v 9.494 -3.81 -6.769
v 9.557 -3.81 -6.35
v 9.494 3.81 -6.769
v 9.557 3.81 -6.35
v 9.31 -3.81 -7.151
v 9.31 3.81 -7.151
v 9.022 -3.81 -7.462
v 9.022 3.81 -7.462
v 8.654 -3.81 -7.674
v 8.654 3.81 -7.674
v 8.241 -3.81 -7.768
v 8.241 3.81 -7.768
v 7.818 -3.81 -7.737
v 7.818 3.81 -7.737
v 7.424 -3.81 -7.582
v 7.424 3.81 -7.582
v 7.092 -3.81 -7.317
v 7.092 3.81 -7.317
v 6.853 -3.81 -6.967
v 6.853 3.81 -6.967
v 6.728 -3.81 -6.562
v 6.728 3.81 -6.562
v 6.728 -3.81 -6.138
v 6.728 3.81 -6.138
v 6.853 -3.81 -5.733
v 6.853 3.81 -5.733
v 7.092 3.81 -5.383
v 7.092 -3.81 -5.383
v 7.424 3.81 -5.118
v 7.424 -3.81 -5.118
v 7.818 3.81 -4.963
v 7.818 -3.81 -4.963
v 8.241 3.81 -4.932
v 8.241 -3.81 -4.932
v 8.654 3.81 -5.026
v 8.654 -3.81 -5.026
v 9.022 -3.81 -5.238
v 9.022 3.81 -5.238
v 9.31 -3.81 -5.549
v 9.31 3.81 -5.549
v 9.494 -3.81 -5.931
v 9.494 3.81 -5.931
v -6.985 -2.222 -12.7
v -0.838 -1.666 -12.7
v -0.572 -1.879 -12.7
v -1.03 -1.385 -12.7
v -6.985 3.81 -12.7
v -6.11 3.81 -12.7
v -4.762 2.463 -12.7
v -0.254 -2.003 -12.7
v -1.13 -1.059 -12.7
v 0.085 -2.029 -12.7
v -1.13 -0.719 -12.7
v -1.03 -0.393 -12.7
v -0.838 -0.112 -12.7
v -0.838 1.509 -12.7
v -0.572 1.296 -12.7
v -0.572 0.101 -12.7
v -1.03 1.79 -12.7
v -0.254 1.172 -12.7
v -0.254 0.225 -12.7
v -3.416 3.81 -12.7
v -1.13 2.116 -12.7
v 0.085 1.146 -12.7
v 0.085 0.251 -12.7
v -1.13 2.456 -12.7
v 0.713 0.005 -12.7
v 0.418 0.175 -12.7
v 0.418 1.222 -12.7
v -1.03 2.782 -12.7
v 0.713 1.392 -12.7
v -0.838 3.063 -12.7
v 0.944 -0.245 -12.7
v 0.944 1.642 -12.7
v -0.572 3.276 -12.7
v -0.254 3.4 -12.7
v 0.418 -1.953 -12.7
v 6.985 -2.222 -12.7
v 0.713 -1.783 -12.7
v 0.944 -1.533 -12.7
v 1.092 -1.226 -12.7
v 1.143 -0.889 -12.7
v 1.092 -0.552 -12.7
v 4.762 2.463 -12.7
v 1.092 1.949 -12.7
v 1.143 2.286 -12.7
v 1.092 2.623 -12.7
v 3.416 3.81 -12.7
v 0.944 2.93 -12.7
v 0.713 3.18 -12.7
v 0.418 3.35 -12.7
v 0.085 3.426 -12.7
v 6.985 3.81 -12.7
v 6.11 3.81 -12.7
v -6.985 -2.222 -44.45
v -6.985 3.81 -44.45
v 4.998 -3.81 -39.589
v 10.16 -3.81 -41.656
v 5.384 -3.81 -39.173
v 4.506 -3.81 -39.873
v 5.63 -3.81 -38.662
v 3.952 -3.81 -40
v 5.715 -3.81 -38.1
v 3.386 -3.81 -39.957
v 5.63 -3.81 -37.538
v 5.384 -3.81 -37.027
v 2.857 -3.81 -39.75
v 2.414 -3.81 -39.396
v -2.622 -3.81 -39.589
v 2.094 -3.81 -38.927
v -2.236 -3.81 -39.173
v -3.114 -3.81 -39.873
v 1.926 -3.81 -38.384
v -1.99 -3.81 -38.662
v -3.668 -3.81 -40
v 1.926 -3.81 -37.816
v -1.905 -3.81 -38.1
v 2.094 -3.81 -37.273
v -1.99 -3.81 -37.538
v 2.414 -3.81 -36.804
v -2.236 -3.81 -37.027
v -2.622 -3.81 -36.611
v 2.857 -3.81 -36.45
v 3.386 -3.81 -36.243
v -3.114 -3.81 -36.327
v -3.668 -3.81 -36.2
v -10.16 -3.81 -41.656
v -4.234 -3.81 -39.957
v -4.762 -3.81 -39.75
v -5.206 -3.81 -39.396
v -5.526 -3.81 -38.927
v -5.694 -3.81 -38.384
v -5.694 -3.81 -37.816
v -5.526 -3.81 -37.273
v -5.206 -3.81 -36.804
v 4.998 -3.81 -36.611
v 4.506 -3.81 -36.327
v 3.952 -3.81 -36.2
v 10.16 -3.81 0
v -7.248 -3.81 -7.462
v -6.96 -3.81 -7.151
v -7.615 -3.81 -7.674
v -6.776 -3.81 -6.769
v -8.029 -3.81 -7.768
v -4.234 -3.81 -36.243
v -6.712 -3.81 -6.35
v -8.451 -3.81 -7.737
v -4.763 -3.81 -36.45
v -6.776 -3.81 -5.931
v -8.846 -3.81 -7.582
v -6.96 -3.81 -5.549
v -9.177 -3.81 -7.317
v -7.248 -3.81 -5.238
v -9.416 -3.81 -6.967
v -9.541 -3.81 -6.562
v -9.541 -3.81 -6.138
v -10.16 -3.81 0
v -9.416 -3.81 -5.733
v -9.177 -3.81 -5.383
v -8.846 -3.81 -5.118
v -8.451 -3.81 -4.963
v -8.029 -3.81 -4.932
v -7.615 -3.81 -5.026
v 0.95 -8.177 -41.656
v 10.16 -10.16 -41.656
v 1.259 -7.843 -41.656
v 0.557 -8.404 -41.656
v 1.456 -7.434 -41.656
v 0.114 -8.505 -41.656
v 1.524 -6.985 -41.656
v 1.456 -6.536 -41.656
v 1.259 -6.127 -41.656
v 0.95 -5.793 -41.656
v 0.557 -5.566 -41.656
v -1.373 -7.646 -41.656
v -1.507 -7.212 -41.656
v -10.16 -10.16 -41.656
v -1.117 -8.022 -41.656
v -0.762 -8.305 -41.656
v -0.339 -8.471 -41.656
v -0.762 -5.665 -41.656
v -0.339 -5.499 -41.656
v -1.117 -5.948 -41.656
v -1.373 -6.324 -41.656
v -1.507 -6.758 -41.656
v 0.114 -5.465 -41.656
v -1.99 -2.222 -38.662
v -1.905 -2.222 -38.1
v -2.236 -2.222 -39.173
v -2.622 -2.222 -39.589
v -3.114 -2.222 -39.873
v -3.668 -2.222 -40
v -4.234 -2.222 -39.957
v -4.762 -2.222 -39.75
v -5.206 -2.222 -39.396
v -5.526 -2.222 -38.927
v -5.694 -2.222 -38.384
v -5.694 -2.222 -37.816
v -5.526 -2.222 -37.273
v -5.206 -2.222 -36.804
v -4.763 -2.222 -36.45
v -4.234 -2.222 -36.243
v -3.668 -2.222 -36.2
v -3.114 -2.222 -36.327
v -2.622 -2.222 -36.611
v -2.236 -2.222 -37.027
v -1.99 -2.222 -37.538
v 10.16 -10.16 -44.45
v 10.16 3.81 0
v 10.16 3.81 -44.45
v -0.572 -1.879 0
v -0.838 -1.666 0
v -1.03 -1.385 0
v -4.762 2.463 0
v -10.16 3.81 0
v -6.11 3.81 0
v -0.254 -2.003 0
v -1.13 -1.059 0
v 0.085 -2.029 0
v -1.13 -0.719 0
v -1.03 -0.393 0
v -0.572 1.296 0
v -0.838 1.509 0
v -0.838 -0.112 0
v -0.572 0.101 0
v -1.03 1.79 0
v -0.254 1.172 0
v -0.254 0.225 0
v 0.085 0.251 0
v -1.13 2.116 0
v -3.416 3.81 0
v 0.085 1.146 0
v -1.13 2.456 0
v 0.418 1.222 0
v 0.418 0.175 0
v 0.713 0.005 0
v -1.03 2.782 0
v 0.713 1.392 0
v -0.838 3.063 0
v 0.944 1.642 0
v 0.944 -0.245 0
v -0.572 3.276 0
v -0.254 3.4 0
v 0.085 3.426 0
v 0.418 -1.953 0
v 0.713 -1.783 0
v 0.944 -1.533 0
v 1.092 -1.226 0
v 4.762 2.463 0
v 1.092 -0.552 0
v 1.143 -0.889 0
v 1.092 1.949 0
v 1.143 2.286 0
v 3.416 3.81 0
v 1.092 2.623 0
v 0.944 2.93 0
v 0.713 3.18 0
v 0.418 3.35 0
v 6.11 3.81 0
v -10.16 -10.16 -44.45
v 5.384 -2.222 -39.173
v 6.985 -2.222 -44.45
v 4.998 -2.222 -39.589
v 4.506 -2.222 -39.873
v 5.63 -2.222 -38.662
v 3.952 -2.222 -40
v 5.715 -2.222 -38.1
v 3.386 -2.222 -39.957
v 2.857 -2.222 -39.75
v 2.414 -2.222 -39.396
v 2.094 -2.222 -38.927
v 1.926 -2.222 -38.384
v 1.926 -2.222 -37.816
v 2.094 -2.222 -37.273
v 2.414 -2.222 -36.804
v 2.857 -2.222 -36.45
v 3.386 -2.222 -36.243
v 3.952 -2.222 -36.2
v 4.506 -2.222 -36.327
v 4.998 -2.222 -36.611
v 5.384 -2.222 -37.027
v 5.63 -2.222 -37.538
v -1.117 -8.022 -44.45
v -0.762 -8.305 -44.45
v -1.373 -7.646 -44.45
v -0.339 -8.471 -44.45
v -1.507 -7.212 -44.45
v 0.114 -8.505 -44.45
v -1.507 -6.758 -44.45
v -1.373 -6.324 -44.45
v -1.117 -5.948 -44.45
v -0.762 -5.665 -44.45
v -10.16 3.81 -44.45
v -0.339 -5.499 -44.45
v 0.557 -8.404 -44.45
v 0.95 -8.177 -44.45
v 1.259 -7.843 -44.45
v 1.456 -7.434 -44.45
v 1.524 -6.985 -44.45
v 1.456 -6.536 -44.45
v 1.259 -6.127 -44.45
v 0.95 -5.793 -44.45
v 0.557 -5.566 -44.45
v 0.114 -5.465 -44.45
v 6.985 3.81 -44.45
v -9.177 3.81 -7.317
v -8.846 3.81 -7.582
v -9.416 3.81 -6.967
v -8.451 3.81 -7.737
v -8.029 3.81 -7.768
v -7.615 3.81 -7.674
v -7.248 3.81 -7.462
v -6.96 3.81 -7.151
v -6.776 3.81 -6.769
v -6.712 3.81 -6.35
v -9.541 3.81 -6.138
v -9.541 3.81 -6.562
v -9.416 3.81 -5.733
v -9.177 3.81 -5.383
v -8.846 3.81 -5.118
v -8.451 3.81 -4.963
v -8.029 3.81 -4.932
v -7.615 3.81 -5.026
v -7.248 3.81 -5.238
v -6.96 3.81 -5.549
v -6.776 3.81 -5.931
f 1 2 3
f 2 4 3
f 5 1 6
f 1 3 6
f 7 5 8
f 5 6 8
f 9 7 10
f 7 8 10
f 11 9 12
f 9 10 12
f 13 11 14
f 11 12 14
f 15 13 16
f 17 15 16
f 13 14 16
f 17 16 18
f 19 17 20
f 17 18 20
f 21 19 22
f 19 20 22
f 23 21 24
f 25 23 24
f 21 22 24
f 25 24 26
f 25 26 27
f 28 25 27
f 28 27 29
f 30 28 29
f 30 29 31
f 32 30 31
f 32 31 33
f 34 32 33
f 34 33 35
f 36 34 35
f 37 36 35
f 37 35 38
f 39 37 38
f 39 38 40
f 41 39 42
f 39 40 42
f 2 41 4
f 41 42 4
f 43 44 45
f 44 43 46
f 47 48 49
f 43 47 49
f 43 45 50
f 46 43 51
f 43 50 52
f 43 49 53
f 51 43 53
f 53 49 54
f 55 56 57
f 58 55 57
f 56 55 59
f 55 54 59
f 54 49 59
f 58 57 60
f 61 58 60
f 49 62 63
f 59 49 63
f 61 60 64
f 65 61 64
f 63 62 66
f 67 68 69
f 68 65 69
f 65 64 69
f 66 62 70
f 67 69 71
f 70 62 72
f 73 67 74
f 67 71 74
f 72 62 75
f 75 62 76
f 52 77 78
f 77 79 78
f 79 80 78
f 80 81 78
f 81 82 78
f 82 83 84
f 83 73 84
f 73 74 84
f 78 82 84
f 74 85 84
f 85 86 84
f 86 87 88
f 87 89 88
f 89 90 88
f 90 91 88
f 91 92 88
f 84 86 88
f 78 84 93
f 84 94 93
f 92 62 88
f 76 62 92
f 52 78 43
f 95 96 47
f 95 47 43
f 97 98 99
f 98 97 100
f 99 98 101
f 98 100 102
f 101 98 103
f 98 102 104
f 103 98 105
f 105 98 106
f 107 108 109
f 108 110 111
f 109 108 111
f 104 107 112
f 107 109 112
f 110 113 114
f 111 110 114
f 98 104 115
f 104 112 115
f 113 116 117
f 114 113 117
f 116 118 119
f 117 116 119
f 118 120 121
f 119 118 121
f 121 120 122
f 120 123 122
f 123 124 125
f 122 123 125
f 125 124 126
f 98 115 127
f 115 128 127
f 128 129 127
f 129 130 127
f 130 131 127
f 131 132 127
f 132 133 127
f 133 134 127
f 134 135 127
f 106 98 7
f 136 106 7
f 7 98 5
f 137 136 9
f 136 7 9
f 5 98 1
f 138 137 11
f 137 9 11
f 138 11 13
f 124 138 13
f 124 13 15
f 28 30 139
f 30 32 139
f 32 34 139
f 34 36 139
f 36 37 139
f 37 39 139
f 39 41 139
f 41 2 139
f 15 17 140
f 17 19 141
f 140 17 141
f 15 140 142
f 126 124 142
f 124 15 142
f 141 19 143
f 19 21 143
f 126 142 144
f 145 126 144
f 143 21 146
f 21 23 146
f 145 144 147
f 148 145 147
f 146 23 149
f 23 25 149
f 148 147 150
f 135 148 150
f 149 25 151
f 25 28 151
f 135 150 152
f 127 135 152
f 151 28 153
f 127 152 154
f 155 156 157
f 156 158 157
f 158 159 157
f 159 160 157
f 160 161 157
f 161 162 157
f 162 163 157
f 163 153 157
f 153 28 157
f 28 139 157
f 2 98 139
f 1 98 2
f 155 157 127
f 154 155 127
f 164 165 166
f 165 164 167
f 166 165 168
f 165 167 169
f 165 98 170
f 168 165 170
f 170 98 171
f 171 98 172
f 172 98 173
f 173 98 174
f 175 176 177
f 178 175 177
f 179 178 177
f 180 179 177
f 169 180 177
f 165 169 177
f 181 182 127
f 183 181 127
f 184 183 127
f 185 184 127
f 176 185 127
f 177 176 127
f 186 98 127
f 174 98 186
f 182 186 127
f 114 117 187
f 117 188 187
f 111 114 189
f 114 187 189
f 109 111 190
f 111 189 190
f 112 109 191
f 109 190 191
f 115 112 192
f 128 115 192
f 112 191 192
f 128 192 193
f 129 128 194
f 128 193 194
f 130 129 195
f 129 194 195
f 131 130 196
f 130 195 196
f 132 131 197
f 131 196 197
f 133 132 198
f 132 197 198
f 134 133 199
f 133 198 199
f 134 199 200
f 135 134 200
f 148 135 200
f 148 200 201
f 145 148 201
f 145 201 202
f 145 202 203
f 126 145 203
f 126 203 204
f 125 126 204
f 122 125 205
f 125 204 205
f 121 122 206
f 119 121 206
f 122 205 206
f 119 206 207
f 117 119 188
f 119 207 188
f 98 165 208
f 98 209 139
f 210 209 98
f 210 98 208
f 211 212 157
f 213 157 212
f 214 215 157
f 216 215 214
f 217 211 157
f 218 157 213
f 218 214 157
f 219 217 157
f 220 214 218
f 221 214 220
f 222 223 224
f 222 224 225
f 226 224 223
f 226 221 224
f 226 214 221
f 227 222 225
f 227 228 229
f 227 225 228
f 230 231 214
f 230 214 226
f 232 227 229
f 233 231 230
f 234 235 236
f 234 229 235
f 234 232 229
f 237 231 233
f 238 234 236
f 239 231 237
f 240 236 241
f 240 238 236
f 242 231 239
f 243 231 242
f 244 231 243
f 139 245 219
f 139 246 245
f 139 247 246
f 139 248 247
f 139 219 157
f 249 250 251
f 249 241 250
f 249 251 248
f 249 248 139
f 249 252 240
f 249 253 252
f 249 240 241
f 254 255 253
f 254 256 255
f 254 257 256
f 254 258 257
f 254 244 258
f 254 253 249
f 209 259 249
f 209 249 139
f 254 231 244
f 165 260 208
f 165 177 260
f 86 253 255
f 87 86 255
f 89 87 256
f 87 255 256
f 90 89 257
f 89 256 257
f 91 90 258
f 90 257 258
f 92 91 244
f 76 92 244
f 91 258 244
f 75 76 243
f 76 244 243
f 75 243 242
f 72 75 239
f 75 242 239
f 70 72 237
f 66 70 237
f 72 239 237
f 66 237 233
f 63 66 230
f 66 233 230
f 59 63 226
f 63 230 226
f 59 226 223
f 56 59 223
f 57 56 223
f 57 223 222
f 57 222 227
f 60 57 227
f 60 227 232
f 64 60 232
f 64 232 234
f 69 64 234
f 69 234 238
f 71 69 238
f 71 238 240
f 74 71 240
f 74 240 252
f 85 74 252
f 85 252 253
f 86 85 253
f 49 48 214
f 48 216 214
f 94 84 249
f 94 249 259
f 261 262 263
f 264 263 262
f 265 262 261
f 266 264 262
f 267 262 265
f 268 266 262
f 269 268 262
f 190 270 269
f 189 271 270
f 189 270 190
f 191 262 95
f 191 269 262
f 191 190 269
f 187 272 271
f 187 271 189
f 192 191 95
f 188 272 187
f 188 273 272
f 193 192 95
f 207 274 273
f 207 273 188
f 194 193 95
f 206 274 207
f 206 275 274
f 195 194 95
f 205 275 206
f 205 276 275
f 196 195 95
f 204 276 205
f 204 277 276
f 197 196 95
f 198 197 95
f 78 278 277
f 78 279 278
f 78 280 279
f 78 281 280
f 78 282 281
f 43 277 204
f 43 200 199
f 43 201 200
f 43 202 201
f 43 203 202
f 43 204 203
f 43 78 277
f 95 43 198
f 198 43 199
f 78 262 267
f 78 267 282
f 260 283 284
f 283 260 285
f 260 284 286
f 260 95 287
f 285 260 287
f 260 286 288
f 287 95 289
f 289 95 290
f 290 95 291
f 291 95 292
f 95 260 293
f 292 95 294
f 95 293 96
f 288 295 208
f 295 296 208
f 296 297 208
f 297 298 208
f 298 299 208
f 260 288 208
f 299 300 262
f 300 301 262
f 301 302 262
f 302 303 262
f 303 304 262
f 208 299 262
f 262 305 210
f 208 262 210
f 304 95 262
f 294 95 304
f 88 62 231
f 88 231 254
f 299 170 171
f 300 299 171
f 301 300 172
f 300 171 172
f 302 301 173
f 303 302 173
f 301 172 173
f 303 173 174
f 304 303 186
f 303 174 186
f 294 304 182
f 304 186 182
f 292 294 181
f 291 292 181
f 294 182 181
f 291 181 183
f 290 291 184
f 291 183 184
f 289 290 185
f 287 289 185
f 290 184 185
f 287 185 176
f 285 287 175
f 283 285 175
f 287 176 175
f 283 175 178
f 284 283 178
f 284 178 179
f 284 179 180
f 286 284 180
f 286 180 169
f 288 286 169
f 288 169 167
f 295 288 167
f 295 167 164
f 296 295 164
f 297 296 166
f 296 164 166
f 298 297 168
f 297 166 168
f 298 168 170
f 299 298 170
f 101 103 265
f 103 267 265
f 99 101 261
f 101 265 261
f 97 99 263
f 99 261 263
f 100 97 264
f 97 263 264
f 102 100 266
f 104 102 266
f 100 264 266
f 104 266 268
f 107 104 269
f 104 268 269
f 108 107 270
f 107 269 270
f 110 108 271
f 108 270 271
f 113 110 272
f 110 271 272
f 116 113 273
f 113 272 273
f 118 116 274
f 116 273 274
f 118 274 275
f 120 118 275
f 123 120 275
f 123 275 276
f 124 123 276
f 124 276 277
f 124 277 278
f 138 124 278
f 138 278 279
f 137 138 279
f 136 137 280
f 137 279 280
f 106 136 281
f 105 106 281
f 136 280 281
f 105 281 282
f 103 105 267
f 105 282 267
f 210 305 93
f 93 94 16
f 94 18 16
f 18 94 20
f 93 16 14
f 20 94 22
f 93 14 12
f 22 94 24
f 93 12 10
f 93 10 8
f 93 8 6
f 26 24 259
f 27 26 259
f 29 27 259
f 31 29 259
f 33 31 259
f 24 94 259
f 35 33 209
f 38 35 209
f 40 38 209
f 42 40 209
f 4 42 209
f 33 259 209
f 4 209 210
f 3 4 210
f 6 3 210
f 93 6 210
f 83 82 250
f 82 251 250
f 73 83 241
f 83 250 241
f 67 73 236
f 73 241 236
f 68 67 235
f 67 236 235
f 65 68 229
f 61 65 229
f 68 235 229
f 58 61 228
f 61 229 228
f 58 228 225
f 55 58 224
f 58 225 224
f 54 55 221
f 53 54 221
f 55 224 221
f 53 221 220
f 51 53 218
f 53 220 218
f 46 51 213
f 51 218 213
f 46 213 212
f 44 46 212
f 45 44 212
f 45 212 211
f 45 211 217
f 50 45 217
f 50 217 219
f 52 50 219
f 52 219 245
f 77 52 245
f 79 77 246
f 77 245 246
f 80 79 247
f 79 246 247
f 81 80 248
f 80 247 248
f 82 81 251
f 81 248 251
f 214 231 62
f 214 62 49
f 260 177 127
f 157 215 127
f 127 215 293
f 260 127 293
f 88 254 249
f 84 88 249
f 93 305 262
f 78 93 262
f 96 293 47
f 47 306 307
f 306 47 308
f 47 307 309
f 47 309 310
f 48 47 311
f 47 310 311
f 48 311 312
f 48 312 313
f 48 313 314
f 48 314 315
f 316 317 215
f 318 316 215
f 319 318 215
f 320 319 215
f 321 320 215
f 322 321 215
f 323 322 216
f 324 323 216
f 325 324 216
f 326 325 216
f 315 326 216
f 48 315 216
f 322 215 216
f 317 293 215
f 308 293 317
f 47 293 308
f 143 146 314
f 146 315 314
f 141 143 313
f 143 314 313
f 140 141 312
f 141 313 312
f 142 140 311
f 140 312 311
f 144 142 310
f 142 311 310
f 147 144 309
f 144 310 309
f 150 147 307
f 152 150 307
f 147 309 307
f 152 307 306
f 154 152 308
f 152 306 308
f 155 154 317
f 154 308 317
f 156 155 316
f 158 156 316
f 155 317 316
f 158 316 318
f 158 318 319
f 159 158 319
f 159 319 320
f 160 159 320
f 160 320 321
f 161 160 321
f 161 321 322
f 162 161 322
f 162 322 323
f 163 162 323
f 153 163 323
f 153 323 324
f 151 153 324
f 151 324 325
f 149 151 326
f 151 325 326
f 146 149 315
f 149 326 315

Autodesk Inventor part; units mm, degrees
ref_plane "YZ Plane" through (0, 0, 0) normal (1, 0, 0) x (0, 1, 0)
ref_plane "XZ Plane" through (0, 0, 0) normal (0, 1, 0) x (-1, 0, 0)
ref_plane "XY Plane" through (0, 0, 0) normal (0, 0, 1) x (1, 0, 0)
sketch "Sketch1" plane through (0, 0, 0) normal (0, 0, 1) x (1, 0, 0)
  line L0 (-10.16, 3.81) -> (10.16, 3.81)
  line L1 (10.16, 3.81) -> (10.16, -3.81)
  line L2 (10.16, -3.81) -> (-10.16, -3.81)
  line L3 (-10.16, -3.81) -> (-10.16, 3.81)
  point P0 (0, 0)
  dimension "d0" = 20.32
  dimension "d1" = 7.62
  dimension "d2" = 3.81
  dimension "d3" = 10.16
extrude "Extrusion1" add sketch "Sketch1" against normal blind 12.7
sketch "Sketch2" plane through (0, 0, 0) normal (0, 0, 1) x (1, 0, 0)
  line L0 (-10.16, 3.81) -> (10.16, 3.81) projected
  circle A0 centre (0, 2.286) radius 1.143
  circle A1 centre (0, -0.889) radius 1.143
  circle A2 centre (-4.7625, 3.81) radius 0.9525
  circle A3 centre (4.7625, 3.81) radius 0.9525
  line L1 (-6.1095, 3.81) -> (-3.5541, 1.2546)
  line L2 (-3.4155, 3.81) -> (-5.4913, 1.7342)
  line L3 (3.4155, 3.81) -> (5.9385, 1.2869)
  line L4 (4.5051, 2.2056) -> (6.1095, 3.81)
  point P0 (0, 0)
  point P1 (-4.7625, 2.463)
  point P2 (4.7625, 2.463)
  dimension "d6" = 2.286
  dimension "d7" = 2.286
  dimension "d8" = 1.524
  dimension "d9" = 3.175
  dimension "d10" = 1.905
  dimension "d11" = 1.905
  dimension "d12" = 0
  dimension "d13" = 0
  dimension "d14" = 9.525
  dimension "d15" = 4.7625
  dimension "d16" = 45
  dimension "d17" = 45
  dimension "d18" = 45
  dimension "d19" = 45
extrude "Extrusion3" cut sketch "Sketch2" against normal blind 12.7 contours L0 A3 L3 | A2 L0 | L0 L2 A2 | A2 L1 L0 | L2 L1 A2 | L0 A3 | A3 L4 L3 | L0 L4 A3 | A0 | A1 picked at (-4.7051, 3.27) picked at (4.6576, 3.5103)
sketch "Sketch3" plane through (-10.16, 3.81, 0) normal (0, 1, 0) x (1, 0, 0)
  line L0 (4.0505, 12.7) -> (0, 12.7) projected
  line L1 (0, 0) -> (0, 12.7) projected
  line L2 (0, 0) -> (4.0505, 0) projected
  circle A0 centre (2.0252, 6.35) radius 1.4224
  point P0 (10.16, 0)
  dimension "d24" = 2.8448
  dimension "d25" = 6.35
  dimension "d26" = 12.7
  dimension "d31" = 4.0505
  dimension "d32" = 2.0252
sketch "Sketch4" plane through (10.16, 3.81, 0) normal (0, 1, 0) x (1, 0, 0)
  line L0 (-4.0505, 0) -> (0, 0) projected
  line L1 (0, 0) -> (0, 12.7) projected
  circle A0 centre (-2.0252, 6.35) radius 1.4224
  point P0 (-4.0505, 12.7)
  point P1 (-10.16, 0)
  dimension "d27" = 2.8448
  dimension "d28" = 6.35
  dimension "d29" = 4.0505
  dimension "d30" = 2.0252
extrude "Extrusion4" cut sketch "Sketch3" against normal blind 12.7
extrude "Extrusion5" cut sketch "Sketch4" against normal blind 12.7
sketch "Sketch5" plane through (0, 0, -12.7) normal (0, 0, -1) x (-1, 0, 0)
  line L0 (-10.16, -3.81) -> (-10.16, 3.81) projected
  line L1 (10.16, -3.81) -> (-10.16, -3.81) projected
  line L2 (10.16, 3.81) -> (10.16, -3.81) projected
  line L3 (-10.16, 3.81) -> (-6.985, 3.81)
  line L4 (-6.985, 3.81) -> (-6.985, -3.81)
  line L5 (-6.985, -3.81) -> (-10.16, -3.81)
  line L6 (-10.16, -3.81) -> (-10.16, 3.81)
  line L7 (10.16, 3.81) -> (6.985, 3.81)
  line L8 (6.985, 3.81) -> (6.985, -3.81)
  line L9 (6.985, -3.81) -> (10.16, -3.81)
  line L10 (10.16, -3.81) -> (10.16, 3.81)
  line L11 (-10.16, -2.2225) -> (6.985, -2.2225)
  line L12 (6.985, -2.2225) -> (6.985, -3.81)
  line L13 (6.985, -3.81) -> (-10.16, -3.81)
  line L14 (-10.16, -3.81) -> (-10.16, -2.2225)
  point P0 (0, 0)
  dimension "d37" = 3.175
  dimension "d38" = 3.175
  dimension "d39" = 1.5875
extrude "Extrusion6" add sketch "Sketch5" along normal blind 31.75
thread "Thread1" size "4-40 UNC" class "2B" standard "ANSI Unified Screw Threads" full length
thread "Thread2" size "4-40 UNC" class "2B" standard "ANSI Unified Screw Threads" full length
sketch "Sketch8" plane through (-10.16, -3.81, 0) normal (0, -1, 0) x (1, 0, 0)
  line L0 (20.32, 0) -> (20.32, -44.45) projected
  line L1 (0, -44.45) -> (20.32, -44.45)
  line L2 (20.32, -44.45) -> (20.32, -41.656)
  line L3 (20.32, -41.656) -> (0, -41.656)
  line L4 (0, -41.656) -> (0, -44.45)
  point P0 (10.16, 0)
  dimension "d58" = 2.794
extrude "Extrusion9" add sketch "Sketch8" along normal blind 6.35
sketch "Sketch9" plane through (-10.16, -3.81, -41.656) normal (0, 0, 1) x (1, 0, 0)
  line L0 (0, 0) -> (20.32, 0) projected
  line L1 (0, 0) -> (0, -6.35) projected
  circle A0 centre (10.16, -3.175) radius 1.524
  point P0 (20.32, -6.35)
  point P1 (10.16, 3.81)
  dimension "d61" = 3.048
  dimension "d62" = 20.32
  dimension "d63" = 6.35
  dimension "d64" = 3.175
  dimension "d65" = 10.16
extrude "Extrusion10" cut sketch "Sketch9" against normal blind 7.62
sketch "Sketch10" plane through (-6.985, -2.2225, -12.7) normal (0, 1, 0) x (1, 0, 0)
  line L0 (13.97, 0) -> (13.97, 31.75) projected
  line L1 (0, 0) -> (0, 31.75) projected
  line L2 (13.97, 0) -> (0, 0) projected
  circle A0 centre (3.175, 25.4) radius 1.905
  circle A1 centre (10.795, 25.4) radius 1.905
  point P0 (6.985, -12.7)
  dimension "d68" = 3.81
  dimension "d69" = 3.81
  dimension "d70" = 3.175
  dimension "d71" = 3.175
  dimension "d72" = 25.4
  dimension "d73" = 25.4
extrude "Extrusion11" cut sketch "Sketch10" against normal blind 7.62
equation "\"d2\" = 0.5 * d1"
equation "\"d3\" = 0.5 * d0"
equation "\"d7\" = d6"
equation "\"d15\" = 0.5 * d14"
equation "\"d25\" = 0.5 * d26"
equation "\"d32\" = 0.5 * d31"
equation "\"d28\" = d25"
equation "\"d30\" = 0.5 * d29"
equation "\"d38\" = d37"
equation "\"d64\" = 0.5 * d63"
equation "\"d65\" = 0.5 * d62"
equation "\"d73\" = d72"
properties part number "lickport_Holder_small"
